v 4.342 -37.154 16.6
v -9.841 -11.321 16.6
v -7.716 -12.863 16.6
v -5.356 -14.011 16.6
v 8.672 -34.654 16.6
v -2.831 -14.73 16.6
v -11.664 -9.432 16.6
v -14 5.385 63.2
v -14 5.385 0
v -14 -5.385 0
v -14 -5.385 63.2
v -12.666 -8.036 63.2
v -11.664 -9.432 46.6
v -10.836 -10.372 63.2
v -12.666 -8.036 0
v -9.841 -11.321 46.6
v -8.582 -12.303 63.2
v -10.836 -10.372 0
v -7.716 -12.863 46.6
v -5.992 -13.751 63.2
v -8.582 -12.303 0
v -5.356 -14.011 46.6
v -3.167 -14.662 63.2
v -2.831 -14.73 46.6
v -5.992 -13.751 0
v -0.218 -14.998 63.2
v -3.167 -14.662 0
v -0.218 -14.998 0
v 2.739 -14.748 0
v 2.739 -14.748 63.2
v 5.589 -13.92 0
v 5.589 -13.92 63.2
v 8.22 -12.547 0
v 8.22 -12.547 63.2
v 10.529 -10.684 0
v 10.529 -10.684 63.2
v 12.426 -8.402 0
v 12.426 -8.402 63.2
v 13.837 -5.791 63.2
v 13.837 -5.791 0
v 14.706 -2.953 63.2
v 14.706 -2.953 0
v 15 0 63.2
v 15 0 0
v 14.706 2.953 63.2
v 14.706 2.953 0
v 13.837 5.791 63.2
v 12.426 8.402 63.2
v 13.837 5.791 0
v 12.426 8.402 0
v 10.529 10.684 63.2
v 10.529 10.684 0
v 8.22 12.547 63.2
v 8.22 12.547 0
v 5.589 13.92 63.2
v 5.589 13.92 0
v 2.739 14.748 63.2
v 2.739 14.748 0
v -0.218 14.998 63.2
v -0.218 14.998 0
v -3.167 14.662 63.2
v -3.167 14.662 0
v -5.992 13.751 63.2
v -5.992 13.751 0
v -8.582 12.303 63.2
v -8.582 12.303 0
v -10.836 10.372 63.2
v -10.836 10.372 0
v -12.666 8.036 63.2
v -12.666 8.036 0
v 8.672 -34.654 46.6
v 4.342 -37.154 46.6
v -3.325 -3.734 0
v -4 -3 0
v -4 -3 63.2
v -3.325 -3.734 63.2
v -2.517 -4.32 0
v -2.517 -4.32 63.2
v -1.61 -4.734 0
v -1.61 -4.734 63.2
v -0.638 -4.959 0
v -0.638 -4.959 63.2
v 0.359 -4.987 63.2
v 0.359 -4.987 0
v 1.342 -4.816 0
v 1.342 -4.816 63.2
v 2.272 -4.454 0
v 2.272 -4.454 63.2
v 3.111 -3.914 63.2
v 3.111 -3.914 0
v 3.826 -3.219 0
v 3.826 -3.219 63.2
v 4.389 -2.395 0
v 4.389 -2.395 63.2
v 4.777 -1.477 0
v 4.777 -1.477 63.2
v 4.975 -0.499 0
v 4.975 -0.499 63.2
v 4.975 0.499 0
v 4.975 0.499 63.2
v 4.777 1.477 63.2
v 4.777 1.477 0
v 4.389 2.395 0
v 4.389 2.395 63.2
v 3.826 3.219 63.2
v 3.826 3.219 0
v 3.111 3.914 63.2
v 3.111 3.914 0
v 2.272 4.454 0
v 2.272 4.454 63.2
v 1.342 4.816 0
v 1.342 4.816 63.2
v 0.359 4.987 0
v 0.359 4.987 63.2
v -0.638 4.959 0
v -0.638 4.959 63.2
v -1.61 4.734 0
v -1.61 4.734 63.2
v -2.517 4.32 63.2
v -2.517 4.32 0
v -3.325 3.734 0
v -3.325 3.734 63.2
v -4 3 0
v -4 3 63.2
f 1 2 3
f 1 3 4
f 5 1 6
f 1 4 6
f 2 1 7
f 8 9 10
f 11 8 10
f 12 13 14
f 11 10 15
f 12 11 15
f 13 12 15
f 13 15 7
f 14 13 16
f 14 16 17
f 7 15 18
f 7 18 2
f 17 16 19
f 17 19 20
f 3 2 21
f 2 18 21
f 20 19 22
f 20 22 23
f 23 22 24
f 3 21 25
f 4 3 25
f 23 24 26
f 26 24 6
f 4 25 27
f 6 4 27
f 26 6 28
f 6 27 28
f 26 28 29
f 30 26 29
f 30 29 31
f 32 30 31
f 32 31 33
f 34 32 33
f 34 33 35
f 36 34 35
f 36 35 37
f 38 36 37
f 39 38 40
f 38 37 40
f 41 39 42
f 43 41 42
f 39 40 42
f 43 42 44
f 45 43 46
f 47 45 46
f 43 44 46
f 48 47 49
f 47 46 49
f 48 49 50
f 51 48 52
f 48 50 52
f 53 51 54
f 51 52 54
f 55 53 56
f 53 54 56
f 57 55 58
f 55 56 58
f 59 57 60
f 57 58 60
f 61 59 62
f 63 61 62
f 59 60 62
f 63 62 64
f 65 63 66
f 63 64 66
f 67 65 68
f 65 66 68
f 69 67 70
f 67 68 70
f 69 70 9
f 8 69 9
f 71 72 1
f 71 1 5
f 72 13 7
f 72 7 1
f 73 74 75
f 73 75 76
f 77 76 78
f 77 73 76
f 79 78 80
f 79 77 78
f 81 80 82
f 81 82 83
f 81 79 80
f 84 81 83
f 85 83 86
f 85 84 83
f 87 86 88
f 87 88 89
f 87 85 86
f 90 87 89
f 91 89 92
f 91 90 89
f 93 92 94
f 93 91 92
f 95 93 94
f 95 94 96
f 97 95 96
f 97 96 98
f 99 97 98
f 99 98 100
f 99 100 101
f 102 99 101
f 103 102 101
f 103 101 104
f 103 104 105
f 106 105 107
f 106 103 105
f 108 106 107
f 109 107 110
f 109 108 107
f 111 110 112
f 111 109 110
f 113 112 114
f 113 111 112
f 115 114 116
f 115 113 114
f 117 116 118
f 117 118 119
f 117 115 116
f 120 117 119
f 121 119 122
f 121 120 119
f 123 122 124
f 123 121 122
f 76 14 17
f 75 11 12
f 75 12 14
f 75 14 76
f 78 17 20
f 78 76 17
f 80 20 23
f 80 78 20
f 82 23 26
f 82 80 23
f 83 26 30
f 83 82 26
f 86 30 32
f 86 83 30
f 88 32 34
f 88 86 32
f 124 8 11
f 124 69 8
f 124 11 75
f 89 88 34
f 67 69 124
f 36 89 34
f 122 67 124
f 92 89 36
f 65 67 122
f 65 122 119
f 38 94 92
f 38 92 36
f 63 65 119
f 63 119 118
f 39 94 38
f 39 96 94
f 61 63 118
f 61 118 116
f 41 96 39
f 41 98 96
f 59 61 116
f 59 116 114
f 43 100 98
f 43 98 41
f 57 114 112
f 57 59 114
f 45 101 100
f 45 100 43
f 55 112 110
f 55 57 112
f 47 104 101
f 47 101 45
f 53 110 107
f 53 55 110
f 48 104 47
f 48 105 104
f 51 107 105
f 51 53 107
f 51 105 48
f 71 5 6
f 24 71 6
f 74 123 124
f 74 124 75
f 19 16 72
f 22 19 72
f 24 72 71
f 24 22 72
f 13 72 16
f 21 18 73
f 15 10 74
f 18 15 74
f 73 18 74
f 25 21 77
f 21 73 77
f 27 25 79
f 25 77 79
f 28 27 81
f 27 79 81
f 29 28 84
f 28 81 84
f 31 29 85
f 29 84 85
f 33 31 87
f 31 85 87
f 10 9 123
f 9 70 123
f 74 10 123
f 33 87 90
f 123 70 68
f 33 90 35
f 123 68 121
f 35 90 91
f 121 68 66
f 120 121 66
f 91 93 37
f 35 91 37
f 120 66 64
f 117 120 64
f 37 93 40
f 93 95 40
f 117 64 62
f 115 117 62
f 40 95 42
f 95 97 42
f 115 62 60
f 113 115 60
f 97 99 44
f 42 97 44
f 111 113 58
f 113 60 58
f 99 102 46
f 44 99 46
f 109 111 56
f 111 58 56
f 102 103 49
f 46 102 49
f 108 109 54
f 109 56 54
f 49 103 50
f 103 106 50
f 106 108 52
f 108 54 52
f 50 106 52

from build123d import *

# Parameters (mm, degrees)
EXTRUDE_1_DEPTH = 63.2
EXTRUDE_START   = -31.6
EXTRUDE_4_DEPTH = 15


with BuildPart() as part:
    # 草图1 → 拉伸-薄壁1 (new body)
    with BuildSketch(Plane.XY):
        with BuildLine():
            Line((-14, 5.385164807), (-14, -5.385164807))
            ThreePointArc((-14, -5.385164807), (15, 0), (-14, 5.385164807))
        make_face()
        with BuildLine():
            Line((-4, 3), (-4, -3))
            ThreePointArc((-4, -3), (5, 0), (-4, 3))
        make_face(mode=Mode.SUBTRACT)
    extrude(amount=EXTRUDE_1_DEPTH)

    # 草图9 → 拉伸-薄壁4 (add, symmetric)
    with BuildSketch(Plane.XY.offset(63.2).offset(EXTRUDE_START)):
        Polygon((-14, -5.385164807), (4.341640192, -37.153817513), (8.671767211, -34.653817513), (-9.669872981, -2.885164807), align=None)
    extrude(amount=EXTRUDE_4_DEPTH, both=True)


solid = part.part
